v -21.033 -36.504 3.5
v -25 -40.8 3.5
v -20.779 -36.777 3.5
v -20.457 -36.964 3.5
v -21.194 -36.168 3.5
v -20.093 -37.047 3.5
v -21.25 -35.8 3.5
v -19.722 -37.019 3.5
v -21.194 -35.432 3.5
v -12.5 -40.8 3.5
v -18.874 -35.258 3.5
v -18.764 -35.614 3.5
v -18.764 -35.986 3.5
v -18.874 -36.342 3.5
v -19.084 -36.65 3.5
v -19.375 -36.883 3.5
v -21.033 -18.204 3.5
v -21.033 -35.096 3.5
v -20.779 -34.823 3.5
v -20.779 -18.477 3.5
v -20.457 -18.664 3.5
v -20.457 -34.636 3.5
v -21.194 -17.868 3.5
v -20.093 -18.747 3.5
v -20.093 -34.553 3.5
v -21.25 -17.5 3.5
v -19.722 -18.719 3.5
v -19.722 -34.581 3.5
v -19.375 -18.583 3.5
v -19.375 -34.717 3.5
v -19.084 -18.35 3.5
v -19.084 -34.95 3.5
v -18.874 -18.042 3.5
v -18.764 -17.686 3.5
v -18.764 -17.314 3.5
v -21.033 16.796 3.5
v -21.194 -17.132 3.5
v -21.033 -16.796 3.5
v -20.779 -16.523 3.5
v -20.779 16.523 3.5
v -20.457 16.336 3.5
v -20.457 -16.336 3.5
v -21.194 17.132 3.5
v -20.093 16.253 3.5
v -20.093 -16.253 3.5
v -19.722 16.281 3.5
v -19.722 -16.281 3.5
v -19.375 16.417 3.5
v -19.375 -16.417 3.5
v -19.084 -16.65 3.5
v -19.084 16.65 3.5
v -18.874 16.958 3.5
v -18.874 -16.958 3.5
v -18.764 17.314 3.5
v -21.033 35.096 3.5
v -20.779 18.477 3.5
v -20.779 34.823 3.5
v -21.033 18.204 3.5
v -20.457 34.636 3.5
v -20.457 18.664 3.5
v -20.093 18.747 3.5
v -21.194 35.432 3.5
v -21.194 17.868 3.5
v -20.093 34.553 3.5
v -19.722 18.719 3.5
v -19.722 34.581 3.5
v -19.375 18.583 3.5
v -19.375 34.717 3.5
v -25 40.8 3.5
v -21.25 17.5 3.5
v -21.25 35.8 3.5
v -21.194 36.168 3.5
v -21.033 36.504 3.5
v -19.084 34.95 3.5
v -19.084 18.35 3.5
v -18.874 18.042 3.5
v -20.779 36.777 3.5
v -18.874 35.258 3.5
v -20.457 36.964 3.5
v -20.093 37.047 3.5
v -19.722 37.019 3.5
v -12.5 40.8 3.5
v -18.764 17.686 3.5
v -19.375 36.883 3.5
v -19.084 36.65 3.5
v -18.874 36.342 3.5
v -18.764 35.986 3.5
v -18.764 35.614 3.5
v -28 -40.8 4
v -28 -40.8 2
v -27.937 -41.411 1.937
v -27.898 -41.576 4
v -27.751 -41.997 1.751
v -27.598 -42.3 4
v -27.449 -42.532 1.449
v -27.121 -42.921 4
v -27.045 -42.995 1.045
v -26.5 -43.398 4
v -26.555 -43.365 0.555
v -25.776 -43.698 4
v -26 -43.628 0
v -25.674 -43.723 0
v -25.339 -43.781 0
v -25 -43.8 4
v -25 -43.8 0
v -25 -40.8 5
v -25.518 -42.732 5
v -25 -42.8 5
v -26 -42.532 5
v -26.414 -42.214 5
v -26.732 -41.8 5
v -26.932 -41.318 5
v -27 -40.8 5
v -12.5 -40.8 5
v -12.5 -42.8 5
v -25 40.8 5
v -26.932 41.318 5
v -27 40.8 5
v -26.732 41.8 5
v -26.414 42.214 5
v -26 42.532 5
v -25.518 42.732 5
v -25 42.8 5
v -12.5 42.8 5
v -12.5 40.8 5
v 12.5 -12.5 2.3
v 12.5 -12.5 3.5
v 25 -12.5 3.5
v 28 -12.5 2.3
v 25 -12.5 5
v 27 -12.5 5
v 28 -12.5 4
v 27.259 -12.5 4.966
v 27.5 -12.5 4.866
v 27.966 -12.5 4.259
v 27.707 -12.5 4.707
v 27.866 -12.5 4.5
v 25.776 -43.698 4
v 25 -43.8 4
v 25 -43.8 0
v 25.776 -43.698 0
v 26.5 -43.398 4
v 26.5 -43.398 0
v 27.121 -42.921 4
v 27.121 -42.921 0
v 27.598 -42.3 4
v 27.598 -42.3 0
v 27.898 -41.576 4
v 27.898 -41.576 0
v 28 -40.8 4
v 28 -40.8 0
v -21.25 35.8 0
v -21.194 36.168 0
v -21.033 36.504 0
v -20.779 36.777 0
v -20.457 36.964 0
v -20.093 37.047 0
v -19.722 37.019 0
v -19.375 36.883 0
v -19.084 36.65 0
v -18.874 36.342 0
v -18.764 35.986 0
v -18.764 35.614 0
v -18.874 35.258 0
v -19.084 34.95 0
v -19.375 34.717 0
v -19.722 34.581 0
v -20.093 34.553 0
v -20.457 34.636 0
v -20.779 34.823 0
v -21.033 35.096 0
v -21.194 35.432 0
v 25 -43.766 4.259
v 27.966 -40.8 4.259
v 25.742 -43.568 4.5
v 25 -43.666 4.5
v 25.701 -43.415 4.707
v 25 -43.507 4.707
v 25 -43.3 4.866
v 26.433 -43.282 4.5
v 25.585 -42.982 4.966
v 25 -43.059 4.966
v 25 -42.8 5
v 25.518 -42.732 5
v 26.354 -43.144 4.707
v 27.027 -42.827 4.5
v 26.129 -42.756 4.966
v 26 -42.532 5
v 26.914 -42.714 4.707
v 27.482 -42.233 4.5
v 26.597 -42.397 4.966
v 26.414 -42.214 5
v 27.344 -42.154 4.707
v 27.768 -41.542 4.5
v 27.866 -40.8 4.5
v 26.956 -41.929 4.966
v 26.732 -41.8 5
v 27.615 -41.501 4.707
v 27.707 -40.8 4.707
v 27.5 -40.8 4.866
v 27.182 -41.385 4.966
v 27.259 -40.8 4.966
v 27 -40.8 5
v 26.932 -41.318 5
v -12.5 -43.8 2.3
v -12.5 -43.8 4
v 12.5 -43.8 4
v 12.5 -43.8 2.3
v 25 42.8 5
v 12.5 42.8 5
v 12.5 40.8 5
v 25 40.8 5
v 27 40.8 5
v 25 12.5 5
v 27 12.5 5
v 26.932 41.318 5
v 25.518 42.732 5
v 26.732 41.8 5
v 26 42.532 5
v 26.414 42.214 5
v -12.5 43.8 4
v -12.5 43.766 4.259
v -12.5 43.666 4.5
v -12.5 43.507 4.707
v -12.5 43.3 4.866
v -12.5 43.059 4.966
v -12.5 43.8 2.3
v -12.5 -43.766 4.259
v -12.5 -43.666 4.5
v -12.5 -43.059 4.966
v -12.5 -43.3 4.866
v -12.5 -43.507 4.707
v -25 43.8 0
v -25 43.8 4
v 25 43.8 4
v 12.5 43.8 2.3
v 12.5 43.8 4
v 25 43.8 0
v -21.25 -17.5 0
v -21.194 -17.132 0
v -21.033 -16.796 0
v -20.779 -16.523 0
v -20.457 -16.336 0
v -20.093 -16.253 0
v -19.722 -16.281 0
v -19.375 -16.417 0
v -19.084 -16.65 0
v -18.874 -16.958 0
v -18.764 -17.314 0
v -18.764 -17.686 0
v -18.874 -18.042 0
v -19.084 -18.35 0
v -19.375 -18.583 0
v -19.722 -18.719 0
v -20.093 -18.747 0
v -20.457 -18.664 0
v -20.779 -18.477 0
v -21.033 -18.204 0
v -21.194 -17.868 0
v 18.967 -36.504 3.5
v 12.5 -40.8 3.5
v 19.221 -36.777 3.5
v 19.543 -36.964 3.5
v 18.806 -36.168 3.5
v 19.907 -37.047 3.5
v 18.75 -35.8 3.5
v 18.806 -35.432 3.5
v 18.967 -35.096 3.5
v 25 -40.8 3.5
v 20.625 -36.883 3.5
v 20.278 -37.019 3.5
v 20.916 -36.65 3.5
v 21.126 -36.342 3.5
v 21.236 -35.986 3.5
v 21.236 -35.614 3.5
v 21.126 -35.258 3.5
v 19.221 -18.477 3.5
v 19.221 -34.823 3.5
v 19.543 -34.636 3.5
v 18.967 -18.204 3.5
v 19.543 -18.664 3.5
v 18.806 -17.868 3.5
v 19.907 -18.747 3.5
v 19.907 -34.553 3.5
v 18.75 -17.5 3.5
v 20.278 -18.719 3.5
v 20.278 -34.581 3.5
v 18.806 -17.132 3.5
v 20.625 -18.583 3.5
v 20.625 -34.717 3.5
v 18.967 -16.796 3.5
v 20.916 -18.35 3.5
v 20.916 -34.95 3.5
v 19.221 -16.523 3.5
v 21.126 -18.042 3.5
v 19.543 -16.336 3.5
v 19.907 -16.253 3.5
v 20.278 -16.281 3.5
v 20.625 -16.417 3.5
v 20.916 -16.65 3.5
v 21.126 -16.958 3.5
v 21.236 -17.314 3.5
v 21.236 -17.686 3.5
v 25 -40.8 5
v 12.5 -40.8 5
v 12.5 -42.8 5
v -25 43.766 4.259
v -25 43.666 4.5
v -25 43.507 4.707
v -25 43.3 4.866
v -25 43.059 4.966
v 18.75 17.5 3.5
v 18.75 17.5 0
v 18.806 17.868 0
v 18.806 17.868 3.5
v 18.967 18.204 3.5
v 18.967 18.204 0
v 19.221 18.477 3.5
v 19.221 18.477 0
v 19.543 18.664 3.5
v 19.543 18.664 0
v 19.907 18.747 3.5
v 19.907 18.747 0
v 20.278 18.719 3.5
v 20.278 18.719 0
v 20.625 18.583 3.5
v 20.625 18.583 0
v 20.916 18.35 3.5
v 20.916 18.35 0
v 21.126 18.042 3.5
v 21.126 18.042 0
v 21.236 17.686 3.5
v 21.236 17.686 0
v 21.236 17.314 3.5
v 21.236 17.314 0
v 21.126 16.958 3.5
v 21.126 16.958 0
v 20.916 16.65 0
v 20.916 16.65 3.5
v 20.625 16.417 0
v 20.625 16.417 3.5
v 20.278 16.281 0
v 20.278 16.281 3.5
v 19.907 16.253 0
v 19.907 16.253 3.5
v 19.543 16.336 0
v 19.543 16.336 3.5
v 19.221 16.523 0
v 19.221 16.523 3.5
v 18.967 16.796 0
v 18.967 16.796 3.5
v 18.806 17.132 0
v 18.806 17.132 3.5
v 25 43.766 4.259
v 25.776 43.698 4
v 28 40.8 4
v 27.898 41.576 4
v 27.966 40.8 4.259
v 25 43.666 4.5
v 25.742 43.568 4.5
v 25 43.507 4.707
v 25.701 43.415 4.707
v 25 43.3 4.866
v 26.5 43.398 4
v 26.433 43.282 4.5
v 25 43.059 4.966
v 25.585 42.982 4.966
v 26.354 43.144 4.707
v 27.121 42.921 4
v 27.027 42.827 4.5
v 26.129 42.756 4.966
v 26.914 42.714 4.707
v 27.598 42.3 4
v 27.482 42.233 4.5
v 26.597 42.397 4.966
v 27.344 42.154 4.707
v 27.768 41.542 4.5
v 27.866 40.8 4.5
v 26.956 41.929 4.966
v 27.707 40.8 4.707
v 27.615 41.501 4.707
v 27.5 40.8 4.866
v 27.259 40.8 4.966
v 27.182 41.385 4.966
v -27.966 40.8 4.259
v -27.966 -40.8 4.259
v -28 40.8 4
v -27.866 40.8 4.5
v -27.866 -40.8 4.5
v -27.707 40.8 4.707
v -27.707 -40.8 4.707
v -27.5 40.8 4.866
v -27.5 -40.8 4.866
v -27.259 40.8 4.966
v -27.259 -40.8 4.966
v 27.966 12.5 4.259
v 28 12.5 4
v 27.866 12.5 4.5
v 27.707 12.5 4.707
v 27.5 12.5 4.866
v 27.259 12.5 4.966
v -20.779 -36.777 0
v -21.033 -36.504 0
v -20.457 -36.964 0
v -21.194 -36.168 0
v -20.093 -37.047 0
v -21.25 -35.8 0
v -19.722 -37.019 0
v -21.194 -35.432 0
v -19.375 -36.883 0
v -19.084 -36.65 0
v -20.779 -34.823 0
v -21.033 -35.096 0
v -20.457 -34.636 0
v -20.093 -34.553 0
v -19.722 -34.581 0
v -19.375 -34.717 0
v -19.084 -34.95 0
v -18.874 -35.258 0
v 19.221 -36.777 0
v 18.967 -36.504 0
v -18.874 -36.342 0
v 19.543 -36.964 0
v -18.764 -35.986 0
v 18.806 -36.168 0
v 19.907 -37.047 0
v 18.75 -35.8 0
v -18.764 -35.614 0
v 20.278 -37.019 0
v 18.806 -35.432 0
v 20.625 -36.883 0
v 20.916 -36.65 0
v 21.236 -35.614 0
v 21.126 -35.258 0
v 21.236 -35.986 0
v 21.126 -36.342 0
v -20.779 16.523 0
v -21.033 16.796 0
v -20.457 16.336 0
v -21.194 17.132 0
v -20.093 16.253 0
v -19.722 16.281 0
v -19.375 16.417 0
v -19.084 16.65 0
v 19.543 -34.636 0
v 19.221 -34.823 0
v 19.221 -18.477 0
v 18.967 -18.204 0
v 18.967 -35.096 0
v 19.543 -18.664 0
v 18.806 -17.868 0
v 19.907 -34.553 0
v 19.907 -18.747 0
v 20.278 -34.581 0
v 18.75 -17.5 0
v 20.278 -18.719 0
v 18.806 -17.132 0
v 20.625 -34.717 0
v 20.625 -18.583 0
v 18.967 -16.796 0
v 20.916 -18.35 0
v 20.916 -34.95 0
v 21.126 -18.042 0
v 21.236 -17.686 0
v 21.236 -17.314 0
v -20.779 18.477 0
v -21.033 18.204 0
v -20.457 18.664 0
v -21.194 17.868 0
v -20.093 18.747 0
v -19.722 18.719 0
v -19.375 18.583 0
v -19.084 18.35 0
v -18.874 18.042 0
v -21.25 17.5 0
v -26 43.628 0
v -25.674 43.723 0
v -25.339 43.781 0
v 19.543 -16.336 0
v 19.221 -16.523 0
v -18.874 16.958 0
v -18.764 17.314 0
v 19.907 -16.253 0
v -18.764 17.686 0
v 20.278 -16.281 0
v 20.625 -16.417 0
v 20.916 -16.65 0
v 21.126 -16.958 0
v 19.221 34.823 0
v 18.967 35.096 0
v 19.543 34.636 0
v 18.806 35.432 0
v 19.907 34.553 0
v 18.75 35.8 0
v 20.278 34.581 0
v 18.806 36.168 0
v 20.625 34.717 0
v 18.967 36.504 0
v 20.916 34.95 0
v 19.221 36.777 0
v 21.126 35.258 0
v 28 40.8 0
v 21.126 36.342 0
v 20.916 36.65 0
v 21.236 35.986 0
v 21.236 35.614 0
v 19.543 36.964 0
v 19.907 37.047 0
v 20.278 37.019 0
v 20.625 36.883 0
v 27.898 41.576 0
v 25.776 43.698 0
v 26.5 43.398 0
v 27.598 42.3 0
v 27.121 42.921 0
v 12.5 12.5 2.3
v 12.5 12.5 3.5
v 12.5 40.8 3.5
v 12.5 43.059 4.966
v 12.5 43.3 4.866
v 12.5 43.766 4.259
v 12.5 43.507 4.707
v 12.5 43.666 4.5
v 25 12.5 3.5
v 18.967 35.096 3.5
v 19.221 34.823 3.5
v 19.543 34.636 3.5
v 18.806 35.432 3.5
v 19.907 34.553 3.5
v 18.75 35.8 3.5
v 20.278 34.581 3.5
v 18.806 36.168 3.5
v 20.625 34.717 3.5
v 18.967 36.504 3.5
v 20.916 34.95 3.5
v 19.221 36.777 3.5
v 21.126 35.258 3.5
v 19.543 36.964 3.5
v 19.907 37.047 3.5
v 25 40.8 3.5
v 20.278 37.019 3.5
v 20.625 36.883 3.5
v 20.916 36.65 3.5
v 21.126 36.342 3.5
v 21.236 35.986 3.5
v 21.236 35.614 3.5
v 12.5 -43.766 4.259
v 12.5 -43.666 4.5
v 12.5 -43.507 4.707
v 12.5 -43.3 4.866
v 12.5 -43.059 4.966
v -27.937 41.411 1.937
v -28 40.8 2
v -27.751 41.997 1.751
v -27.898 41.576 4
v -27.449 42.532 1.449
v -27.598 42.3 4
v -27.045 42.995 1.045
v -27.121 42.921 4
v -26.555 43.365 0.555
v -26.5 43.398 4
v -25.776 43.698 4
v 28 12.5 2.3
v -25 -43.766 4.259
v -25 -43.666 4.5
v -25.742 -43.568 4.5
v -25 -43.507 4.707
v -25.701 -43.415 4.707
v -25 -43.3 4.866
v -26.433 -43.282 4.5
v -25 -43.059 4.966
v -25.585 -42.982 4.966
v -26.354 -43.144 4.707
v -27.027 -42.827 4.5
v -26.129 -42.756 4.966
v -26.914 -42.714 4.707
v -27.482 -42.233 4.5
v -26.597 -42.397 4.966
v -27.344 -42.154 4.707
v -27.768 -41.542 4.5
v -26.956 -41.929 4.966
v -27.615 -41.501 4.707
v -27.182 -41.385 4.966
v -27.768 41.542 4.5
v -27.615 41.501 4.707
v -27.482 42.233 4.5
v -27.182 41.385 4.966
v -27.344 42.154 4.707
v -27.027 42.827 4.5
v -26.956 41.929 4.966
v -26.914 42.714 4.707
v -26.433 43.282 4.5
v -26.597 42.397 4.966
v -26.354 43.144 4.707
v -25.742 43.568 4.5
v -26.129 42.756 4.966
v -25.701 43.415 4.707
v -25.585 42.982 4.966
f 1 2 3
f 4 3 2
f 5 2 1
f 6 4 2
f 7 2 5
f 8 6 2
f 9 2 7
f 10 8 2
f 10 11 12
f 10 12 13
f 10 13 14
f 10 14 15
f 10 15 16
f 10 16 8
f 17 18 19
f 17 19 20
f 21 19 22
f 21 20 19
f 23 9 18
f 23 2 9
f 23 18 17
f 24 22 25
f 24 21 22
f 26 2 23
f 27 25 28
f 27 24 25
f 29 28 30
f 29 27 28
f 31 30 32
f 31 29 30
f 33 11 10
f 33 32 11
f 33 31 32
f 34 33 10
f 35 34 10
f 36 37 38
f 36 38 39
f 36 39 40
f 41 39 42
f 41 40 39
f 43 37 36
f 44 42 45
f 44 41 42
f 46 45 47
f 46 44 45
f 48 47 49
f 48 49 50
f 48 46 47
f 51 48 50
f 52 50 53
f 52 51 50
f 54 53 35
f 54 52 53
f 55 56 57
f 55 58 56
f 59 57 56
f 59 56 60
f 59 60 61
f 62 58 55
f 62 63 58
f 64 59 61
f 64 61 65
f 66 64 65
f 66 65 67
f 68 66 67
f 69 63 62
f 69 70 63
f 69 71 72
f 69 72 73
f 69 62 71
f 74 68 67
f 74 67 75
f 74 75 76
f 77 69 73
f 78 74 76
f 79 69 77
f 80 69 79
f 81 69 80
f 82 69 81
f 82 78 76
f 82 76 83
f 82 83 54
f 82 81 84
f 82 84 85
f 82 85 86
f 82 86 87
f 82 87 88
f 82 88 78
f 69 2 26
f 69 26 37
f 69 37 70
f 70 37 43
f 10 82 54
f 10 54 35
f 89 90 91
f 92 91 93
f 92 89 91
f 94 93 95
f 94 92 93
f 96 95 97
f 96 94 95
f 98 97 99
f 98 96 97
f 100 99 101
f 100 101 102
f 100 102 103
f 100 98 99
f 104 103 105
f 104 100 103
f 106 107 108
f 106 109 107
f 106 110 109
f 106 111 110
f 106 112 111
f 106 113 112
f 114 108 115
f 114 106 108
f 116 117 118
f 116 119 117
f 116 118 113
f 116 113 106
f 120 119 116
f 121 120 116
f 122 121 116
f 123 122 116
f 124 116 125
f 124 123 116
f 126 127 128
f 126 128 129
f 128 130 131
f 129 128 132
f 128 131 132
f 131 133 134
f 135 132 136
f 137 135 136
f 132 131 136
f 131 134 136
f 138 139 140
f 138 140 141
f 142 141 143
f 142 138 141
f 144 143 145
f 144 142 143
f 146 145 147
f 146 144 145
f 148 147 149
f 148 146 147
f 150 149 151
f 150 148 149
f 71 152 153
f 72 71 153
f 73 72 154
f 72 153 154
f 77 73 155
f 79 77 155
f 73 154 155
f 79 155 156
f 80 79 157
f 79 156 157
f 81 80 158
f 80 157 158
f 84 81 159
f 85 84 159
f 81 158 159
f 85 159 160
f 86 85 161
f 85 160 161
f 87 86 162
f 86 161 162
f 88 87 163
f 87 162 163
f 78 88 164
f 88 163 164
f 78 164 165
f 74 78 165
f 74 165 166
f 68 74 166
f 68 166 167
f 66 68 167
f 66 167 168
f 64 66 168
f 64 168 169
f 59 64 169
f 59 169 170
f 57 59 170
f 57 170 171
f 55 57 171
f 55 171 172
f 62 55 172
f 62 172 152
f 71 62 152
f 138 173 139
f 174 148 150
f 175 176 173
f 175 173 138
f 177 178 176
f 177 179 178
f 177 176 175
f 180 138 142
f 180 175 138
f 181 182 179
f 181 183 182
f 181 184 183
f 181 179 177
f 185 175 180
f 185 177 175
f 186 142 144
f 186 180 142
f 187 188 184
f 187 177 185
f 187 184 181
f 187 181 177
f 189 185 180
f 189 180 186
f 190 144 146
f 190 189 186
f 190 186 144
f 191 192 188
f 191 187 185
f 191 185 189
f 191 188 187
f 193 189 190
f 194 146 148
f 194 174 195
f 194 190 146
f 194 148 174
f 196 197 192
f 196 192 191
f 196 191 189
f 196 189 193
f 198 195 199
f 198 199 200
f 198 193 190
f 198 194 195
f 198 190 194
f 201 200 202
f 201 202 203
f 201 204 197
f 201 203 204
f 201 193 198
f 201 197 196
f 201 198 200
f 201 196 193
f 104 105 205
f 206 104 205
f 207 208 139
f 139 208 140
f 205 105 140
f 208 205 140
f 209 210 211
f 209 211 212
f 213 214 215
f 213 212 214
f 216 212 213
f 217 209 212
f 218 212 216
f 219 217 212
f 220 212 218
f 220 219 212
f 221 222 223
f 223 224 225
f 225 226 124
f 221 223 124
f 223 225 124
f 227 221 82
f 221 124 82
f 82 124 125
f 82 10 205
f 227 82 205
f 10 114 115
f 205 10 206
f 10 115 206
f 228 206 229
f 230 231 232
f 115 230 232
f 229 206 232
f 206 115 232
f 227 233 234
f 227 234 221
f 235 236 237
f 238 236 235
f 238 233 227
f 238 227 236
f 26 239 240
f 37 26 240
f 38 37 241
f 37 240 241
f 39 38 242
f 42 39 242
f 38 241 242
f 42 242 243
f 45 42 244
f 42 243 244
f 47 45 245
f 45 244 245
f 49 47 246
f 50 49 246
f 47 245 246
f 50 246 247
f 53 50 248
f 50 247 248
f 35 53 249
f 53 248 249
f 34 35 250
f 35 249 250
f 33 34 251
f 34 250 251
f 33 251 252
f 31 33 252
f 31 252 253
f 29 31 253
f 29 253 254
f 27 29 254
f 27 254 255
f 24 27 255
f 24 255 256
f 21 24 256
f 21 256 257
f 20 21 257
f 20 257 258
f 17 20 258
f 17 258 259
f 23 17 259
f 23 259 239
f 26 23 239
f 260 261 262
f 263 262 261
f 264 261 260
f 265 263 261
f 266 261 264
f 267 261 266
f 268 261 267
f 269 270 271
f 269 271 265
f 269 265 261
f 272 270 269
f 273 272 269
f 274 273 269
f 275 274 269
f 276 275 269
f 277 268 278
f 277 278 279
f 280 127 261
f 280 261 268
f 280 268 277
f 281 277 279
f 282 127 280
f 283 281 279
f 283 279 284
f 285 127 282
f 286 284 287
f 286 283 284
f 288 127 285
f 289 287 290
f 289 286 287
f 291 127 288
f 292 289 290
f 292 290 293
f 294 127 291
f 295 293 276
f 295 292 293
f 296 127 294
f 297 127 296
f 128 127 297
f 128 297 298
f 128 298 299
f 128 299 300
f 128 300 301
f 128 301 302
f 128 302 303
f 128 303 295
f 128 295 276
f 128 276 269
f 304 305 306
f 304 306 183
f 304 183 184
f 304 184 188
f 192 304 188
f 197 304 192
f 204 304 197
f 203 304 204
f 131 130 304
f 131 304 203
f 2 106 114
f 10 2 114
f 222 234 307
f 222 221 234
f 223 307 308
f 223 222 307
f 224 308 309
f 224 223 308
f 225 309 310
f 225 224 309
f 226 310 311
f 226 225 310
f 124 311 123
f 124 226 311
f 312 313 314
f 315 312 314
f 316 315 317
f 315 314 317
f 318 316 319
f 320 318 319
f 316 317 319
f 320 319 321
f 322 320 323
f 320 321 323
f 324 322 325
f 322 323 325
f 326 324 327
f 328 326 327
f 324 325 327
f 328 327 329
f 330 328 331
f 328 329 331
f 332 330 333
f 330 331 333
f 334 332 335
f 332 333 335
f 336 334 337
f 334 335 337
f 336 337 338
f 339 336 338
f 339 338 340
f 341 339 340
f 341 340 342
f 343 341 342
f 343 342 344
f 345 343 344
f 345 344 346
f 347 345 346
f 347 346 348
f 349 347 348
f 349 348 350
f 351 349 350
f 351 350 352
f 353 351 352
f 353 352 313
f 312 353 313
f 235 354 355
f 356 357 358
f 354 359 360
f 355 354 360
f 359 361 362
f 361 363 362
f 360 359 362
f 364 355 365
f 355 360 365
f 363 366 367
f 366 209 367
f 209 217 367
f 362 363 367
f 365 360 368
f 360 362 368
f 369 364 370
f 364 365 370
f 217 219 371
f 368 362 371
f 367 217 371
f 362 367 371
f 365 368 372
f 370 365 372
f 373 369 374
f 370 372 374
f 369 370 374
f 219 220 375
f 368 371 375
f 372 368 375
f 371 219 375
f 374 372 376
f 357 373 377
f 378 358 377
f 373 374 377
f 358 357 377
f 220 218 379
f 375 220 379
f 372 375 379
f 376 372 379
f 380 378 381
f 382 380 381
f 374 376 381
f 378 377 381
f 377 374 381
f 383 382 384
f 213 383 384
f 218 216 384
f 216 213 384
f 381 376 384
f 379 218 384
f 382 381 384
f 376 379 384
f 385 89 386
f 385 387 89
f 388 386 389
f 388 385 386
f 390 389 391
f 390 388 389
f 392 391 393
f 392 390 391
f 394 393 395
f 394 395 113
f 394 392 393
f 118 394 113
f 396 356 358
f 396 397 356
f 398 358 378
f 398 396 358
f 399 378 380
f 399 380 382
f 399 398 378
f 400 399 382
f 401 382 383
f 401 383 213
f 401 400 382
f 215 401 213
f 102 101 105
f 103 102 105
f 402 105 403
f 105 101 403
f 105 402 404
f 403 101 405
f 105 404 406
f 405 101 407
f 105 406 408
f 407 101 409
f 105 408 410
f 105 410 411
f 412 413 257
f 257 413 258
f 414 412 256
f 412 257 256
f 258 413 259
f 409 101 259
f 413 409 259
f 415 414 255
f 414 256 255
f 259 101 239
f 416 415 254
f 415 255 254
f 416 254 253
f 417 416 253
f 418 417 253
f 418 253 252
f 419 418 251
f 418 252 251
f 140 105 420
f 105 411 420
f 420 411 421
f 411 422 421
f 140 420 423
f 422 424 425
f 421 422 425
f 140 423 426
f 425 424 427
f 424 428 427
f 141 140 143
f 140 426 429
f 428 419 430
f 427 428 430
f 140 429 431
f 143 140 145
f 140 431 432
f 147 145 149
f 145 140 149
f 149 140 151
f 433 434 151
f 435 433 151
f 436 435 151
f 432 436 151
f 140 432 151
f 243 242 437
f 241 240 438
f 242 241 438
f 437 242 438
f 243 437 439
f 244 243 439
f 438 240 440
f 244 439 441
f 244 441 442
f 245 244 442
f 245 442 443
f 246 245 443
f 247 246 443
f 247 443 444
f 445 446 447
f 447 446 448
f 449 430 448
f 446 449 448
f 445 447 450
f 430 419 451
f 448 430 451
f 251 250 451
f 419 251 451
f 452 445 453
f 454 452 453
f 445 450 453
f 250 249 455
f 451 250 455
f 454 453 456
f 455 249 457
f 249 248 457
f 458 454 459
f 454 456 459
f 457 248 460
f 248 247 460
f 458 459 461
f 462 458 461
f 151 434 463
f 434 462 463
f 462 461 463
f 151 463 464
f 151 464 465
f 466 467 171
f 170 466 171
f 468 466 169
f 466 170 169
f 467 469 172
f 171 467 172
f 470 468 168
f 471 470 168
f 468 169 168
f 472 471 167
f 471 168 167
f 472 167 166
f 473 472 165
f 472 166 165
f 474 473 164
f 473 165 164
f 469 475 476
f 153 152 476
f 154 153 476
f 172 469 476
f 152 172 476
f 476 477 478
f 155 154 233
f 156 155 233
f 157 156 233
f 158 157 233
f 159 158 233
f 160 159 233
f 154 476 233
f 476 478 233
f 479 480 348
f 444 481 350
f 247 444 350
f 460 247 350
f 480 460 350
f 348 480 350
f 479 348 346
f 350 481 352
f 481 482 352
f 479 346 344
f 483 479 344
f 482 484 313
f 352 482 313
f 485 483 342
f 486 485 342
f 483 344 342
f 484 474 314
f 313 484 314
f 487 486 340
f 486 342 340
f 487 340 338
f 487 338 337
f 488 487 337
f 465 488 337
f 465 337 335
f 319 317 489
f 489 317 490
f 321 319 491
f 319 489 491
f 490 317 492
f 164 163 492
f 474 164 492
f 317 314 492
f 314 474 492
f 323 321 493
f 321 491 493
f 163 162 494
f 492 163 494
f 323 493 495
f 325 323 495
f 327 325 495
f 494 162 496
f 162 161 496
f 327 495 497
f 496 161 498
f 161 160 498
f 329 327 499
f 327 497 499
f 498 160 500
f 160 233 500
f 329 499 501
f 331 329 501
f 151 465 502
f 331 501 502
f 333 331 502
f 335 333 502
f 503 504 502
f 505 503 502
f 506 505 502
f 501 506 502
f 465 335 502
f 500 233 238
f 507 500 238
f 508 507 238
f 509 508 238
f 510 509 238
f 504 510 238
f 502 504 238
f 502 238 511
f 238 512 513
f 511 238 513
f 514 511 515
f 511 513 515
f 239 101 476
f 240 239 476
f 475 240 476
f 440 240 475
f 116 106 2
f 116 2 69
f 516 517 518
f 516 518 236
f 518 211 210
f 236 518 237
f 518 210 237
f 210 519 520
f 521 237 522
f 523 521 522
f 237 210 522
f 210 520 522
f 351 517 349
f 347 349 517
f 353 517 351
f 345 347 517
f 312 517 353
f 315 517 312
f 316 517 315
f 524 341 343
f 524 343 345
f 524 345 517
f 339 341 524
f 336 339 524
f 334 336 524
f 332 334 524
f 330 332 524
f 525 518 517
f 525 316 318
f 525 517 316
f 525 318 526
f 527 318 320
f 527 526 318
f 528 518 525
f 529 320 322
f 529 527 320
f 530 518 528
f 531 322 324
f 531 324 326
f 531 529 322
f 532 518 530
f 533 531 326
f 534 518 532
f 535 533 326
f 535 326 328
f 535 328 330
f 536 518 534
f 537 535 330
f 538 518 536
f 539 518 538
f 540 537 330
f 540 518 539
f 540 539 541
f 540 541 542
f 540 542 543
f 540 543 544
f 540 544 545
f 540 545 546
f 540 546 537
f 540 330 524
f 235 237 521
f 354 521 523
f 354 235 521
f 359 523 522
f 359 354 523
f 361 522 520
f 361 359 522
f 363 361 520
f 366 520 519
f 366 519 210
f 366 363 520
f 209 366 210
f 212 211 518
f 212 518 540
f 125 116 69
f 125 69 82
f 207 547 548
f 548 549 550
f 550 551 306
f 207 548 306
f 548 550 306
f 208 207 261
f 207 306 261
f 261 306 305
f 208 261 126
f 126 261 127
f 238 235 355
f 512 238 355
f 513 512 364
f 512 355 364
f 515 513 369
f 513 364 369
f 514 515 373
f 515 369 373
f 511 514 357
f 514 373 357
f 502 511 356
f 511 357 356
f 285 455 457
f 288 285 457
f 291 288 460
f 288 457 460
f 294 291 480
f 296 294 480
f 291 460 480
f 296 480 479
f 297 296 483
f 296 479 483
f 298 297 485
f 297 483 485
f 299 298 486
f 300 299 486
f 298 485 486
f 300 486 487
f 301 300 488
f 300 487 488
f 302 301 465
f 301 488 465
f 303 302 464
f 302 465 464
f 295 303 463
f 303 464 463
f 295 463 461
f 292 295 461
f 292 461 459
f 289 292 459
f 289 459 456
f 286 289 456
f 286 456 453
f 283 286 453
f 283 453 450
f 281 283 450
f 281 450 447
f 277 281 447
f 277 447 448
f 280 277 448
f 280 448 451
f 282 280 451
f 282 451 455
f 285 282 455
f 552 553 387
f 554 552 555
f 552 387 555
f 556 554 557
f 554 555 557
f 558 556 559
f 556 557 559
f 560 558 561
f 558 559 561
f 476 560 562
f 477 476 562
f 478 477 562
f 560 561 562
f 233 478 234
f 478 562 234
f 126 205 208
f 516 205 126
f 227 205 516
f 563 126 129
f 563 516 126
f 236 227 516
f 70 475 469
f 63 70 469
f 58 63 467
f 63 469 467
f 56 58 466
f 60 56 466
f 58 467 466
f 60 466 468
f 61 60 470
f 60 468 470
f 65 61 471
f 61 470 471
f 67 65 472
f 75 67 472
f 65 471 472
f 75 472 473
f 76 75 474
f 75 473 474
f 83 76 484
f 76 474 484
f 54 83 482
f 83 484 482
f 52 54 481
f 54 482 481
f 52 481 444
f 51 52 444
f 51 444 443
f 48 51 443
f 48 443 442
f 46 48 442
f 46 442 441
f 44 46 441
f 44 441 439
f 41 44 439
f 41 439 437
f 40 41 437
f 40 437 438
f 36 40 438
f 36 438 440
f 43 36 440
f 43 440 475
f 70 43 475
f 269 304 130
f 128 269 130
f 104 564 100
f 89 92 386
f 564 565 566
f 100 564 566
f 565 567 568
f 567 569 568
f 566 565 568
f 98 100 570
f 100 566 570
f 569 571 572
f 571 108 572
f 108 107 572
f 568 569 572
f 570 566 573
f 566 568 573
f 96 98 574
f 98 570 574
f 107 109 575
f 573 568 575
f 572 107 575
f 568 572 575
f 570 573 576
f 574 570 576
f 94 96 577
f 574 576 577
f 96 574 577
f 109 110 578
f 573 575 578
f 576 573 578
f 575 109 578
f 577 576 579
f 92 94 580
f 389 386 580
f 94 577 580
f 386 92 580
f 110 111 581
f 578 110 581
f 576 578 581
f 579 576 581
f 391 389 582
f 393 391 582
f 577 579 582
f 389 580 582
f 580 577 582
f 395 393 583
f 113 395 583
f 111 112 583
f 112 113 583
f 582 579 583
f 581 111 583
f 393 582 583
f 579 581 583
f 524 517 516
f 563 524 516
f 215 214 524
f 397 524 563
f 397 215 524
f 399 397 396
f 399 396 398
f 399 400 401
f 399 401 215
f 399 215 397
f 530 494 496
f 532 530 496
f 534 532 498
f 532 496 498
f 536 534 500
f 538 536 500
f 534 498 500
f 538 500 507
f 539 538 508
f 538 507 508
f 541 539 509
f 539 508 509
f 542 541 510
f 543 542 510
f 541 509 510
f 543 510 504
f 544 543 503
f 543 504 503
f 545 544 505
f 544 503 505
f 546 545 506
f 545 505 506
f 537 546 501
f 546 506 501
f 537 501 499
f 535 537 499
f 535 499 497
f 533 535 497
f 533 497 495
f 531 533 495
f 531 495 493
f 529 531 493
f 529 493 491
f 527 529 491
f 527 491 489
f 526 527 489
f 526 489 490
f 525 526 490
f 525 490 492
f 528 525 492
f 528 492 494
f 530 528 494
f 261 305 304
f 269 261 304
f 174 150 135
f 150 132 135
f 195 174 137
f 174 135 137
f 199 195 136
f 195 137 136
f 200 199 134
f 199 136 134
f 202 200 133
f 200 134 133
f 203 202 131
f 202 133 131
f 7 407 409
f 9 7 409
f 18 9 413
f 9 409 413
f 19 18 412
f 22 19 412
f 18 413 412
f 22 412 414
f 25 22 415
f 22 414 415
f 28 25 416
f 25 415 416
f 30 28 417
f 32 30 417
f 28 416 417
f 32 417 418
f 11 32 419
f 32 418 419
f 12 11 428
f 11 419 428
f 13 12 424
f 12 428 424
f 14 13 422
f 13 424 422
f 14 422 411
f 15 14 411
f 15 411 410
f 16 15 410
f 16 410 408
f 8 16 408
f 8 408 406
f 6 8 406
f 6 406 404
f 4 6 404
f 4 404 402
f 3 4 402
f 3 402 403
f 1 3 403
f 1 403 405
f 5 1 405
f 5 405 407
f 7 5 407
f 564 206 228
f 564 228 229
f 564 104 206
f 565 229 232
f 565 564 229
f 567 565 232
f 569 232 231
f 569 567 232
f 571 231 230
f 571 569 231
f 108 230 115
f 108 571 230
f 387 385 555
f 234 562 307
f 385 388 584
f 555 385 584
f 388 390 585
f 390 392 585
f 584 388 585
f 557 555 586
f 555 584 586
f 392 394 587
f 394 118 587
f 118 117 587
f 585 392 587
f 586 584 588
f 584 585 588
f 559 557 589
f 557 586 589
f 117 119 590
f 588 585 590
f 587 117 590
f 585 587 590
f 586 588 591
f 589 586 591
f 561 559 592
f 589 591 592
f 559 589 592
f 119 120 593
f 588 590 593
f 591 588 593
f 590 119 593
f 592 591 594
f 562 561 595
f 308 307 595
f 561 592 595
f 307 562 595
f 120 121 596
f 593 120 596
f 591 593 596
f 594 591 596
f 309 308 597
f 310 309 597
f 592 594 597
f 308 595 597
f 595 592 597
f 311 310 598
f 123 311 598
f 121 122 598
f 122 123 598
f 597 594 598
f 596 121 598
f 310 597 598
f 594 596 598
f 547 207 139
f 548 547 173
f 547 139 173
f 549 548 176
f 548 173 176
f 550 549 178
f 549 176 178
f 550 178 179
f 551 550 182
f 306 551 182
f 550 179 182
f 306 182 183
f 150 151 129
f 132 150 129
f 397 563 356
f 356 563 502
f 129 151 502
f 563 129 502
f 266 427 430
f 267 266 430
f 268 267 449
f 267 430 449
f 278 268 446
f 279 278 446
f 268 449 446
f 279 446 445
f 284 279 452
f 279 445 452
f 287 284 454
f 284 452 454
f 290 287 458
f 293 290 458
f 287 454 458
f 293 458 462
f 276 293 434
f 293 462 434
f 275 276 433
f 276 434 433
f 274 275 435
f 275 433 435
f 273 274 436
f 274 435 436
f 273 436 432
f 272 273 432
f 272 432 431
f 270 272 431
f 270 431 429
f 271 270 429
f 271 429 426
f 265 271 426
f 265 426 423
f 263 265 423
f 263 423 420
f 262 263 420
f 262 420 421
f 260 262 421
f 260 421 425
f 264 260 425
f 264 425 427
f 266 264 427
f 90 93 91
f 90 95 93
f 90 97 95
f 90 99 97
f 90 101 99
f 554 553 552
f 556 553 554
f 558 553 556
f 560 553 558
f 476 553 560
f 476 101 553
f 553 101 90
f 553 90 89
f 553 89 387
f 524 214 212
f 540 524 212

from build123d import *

# Parameters (mm, degrees)
F0_W      = 56
F0_H      = 87.6
F1_DEPTH  = 5
F2_SIZE   = 2
F3_W      = 15.5
F3_H      = 25
F4_DEPTH  = 2.7
F5_R      = 3
F7_W      = 50
F7_H      = 81.6
F8_DEPTH  = 1.5
F9_R      = 1
F10_D     = 2.5
F10_DEPTH = 68
F10_START = 1.5
F10_TIP   = 0.7510757738


with BuildPart() as f1:
    # F0 (on Top) → F1 (new body)
    with BuildSketch(Plane.XY):
        Rectangle(F0_W, F0_H)
    extrude(amount=F1_DEPTH)

    # F2
    f2_edges = [f1.edges().sort_by_distance(p)[0] for p in [
        (-28, 0, 0),
    ]]
    chamfer(f2_edges, length=F2_SIZE)

    # F3 (on face) → F4 (cut)
    with BuildSketch(Plane.XY.offset(5)):
        Polygon((12.5, 43.8), (-12.5, 43.8), (-12.5, -43.8), (12.5, -43.8), (12.5, -12.5), (12.5, 12.5), align=None)
        with Locations((20.25, 0)):
            Rectangle(F3_W, F3_H)
    extrude(amount=-F4_DEPTH, mode=Mode.SUBTRACT)

    # F5
    f5_edges = [f1.edges().sort_by_distance(p)[0] for p in [
        (-28, 43.8, 3.5),
        (-28, -43.8, 3.5),
        (28, -43.8, 2.5),
        (28, 43.8, 2.5),
    ]]
    fillet(f5_edges, radius=F5_R)

    # F7 (on offset) → F8 (cut)
    with BuildSketch(Plane.XY.offset(5)):
        Rectangle(F7_W, F7_H)
    extrude(amount=-F8_DEPTH, mode=Mode.SUBTRACT)

    # F9
    f9_edges = [f1.edges().sort_by_distance(p)[0] for p in [
        (-27.12132, 42.92132, 5),
        (27.12132, 42.92132, 5),
        (18.75, 43.8, 5),
        (-18.75, 43.8, 5),
        (-28, 0, 5),
        (-18.75, -43.8, 5),
        (27.12132, -42.92132, 5),
    ]]
    fillet(f9_edges, radius=F9_R)

    # F10
    # its depths count from where the whole tool has entered the part; down to there all is cleared
    with Locations(Plane.XY.offset(5).offset(-F10_START)):
        with Locations((-20, 35.8), (20, 35.8), (20, 17.5), (20, -17.5), (20, -35.8), (-20, -35.8), (-20, 17.5), (-20, -17.5)):
            Hole(F10_D / 2, depth=F10_DEPTH)
            with Locations((0, 0, -(F10_DEPTH + F10_TIP / 2))):  # 118° drill point
                Cone(0, F10_D / 2, F10_TIP, mode=Mode.SUBTRACT)


solid = f1.part
